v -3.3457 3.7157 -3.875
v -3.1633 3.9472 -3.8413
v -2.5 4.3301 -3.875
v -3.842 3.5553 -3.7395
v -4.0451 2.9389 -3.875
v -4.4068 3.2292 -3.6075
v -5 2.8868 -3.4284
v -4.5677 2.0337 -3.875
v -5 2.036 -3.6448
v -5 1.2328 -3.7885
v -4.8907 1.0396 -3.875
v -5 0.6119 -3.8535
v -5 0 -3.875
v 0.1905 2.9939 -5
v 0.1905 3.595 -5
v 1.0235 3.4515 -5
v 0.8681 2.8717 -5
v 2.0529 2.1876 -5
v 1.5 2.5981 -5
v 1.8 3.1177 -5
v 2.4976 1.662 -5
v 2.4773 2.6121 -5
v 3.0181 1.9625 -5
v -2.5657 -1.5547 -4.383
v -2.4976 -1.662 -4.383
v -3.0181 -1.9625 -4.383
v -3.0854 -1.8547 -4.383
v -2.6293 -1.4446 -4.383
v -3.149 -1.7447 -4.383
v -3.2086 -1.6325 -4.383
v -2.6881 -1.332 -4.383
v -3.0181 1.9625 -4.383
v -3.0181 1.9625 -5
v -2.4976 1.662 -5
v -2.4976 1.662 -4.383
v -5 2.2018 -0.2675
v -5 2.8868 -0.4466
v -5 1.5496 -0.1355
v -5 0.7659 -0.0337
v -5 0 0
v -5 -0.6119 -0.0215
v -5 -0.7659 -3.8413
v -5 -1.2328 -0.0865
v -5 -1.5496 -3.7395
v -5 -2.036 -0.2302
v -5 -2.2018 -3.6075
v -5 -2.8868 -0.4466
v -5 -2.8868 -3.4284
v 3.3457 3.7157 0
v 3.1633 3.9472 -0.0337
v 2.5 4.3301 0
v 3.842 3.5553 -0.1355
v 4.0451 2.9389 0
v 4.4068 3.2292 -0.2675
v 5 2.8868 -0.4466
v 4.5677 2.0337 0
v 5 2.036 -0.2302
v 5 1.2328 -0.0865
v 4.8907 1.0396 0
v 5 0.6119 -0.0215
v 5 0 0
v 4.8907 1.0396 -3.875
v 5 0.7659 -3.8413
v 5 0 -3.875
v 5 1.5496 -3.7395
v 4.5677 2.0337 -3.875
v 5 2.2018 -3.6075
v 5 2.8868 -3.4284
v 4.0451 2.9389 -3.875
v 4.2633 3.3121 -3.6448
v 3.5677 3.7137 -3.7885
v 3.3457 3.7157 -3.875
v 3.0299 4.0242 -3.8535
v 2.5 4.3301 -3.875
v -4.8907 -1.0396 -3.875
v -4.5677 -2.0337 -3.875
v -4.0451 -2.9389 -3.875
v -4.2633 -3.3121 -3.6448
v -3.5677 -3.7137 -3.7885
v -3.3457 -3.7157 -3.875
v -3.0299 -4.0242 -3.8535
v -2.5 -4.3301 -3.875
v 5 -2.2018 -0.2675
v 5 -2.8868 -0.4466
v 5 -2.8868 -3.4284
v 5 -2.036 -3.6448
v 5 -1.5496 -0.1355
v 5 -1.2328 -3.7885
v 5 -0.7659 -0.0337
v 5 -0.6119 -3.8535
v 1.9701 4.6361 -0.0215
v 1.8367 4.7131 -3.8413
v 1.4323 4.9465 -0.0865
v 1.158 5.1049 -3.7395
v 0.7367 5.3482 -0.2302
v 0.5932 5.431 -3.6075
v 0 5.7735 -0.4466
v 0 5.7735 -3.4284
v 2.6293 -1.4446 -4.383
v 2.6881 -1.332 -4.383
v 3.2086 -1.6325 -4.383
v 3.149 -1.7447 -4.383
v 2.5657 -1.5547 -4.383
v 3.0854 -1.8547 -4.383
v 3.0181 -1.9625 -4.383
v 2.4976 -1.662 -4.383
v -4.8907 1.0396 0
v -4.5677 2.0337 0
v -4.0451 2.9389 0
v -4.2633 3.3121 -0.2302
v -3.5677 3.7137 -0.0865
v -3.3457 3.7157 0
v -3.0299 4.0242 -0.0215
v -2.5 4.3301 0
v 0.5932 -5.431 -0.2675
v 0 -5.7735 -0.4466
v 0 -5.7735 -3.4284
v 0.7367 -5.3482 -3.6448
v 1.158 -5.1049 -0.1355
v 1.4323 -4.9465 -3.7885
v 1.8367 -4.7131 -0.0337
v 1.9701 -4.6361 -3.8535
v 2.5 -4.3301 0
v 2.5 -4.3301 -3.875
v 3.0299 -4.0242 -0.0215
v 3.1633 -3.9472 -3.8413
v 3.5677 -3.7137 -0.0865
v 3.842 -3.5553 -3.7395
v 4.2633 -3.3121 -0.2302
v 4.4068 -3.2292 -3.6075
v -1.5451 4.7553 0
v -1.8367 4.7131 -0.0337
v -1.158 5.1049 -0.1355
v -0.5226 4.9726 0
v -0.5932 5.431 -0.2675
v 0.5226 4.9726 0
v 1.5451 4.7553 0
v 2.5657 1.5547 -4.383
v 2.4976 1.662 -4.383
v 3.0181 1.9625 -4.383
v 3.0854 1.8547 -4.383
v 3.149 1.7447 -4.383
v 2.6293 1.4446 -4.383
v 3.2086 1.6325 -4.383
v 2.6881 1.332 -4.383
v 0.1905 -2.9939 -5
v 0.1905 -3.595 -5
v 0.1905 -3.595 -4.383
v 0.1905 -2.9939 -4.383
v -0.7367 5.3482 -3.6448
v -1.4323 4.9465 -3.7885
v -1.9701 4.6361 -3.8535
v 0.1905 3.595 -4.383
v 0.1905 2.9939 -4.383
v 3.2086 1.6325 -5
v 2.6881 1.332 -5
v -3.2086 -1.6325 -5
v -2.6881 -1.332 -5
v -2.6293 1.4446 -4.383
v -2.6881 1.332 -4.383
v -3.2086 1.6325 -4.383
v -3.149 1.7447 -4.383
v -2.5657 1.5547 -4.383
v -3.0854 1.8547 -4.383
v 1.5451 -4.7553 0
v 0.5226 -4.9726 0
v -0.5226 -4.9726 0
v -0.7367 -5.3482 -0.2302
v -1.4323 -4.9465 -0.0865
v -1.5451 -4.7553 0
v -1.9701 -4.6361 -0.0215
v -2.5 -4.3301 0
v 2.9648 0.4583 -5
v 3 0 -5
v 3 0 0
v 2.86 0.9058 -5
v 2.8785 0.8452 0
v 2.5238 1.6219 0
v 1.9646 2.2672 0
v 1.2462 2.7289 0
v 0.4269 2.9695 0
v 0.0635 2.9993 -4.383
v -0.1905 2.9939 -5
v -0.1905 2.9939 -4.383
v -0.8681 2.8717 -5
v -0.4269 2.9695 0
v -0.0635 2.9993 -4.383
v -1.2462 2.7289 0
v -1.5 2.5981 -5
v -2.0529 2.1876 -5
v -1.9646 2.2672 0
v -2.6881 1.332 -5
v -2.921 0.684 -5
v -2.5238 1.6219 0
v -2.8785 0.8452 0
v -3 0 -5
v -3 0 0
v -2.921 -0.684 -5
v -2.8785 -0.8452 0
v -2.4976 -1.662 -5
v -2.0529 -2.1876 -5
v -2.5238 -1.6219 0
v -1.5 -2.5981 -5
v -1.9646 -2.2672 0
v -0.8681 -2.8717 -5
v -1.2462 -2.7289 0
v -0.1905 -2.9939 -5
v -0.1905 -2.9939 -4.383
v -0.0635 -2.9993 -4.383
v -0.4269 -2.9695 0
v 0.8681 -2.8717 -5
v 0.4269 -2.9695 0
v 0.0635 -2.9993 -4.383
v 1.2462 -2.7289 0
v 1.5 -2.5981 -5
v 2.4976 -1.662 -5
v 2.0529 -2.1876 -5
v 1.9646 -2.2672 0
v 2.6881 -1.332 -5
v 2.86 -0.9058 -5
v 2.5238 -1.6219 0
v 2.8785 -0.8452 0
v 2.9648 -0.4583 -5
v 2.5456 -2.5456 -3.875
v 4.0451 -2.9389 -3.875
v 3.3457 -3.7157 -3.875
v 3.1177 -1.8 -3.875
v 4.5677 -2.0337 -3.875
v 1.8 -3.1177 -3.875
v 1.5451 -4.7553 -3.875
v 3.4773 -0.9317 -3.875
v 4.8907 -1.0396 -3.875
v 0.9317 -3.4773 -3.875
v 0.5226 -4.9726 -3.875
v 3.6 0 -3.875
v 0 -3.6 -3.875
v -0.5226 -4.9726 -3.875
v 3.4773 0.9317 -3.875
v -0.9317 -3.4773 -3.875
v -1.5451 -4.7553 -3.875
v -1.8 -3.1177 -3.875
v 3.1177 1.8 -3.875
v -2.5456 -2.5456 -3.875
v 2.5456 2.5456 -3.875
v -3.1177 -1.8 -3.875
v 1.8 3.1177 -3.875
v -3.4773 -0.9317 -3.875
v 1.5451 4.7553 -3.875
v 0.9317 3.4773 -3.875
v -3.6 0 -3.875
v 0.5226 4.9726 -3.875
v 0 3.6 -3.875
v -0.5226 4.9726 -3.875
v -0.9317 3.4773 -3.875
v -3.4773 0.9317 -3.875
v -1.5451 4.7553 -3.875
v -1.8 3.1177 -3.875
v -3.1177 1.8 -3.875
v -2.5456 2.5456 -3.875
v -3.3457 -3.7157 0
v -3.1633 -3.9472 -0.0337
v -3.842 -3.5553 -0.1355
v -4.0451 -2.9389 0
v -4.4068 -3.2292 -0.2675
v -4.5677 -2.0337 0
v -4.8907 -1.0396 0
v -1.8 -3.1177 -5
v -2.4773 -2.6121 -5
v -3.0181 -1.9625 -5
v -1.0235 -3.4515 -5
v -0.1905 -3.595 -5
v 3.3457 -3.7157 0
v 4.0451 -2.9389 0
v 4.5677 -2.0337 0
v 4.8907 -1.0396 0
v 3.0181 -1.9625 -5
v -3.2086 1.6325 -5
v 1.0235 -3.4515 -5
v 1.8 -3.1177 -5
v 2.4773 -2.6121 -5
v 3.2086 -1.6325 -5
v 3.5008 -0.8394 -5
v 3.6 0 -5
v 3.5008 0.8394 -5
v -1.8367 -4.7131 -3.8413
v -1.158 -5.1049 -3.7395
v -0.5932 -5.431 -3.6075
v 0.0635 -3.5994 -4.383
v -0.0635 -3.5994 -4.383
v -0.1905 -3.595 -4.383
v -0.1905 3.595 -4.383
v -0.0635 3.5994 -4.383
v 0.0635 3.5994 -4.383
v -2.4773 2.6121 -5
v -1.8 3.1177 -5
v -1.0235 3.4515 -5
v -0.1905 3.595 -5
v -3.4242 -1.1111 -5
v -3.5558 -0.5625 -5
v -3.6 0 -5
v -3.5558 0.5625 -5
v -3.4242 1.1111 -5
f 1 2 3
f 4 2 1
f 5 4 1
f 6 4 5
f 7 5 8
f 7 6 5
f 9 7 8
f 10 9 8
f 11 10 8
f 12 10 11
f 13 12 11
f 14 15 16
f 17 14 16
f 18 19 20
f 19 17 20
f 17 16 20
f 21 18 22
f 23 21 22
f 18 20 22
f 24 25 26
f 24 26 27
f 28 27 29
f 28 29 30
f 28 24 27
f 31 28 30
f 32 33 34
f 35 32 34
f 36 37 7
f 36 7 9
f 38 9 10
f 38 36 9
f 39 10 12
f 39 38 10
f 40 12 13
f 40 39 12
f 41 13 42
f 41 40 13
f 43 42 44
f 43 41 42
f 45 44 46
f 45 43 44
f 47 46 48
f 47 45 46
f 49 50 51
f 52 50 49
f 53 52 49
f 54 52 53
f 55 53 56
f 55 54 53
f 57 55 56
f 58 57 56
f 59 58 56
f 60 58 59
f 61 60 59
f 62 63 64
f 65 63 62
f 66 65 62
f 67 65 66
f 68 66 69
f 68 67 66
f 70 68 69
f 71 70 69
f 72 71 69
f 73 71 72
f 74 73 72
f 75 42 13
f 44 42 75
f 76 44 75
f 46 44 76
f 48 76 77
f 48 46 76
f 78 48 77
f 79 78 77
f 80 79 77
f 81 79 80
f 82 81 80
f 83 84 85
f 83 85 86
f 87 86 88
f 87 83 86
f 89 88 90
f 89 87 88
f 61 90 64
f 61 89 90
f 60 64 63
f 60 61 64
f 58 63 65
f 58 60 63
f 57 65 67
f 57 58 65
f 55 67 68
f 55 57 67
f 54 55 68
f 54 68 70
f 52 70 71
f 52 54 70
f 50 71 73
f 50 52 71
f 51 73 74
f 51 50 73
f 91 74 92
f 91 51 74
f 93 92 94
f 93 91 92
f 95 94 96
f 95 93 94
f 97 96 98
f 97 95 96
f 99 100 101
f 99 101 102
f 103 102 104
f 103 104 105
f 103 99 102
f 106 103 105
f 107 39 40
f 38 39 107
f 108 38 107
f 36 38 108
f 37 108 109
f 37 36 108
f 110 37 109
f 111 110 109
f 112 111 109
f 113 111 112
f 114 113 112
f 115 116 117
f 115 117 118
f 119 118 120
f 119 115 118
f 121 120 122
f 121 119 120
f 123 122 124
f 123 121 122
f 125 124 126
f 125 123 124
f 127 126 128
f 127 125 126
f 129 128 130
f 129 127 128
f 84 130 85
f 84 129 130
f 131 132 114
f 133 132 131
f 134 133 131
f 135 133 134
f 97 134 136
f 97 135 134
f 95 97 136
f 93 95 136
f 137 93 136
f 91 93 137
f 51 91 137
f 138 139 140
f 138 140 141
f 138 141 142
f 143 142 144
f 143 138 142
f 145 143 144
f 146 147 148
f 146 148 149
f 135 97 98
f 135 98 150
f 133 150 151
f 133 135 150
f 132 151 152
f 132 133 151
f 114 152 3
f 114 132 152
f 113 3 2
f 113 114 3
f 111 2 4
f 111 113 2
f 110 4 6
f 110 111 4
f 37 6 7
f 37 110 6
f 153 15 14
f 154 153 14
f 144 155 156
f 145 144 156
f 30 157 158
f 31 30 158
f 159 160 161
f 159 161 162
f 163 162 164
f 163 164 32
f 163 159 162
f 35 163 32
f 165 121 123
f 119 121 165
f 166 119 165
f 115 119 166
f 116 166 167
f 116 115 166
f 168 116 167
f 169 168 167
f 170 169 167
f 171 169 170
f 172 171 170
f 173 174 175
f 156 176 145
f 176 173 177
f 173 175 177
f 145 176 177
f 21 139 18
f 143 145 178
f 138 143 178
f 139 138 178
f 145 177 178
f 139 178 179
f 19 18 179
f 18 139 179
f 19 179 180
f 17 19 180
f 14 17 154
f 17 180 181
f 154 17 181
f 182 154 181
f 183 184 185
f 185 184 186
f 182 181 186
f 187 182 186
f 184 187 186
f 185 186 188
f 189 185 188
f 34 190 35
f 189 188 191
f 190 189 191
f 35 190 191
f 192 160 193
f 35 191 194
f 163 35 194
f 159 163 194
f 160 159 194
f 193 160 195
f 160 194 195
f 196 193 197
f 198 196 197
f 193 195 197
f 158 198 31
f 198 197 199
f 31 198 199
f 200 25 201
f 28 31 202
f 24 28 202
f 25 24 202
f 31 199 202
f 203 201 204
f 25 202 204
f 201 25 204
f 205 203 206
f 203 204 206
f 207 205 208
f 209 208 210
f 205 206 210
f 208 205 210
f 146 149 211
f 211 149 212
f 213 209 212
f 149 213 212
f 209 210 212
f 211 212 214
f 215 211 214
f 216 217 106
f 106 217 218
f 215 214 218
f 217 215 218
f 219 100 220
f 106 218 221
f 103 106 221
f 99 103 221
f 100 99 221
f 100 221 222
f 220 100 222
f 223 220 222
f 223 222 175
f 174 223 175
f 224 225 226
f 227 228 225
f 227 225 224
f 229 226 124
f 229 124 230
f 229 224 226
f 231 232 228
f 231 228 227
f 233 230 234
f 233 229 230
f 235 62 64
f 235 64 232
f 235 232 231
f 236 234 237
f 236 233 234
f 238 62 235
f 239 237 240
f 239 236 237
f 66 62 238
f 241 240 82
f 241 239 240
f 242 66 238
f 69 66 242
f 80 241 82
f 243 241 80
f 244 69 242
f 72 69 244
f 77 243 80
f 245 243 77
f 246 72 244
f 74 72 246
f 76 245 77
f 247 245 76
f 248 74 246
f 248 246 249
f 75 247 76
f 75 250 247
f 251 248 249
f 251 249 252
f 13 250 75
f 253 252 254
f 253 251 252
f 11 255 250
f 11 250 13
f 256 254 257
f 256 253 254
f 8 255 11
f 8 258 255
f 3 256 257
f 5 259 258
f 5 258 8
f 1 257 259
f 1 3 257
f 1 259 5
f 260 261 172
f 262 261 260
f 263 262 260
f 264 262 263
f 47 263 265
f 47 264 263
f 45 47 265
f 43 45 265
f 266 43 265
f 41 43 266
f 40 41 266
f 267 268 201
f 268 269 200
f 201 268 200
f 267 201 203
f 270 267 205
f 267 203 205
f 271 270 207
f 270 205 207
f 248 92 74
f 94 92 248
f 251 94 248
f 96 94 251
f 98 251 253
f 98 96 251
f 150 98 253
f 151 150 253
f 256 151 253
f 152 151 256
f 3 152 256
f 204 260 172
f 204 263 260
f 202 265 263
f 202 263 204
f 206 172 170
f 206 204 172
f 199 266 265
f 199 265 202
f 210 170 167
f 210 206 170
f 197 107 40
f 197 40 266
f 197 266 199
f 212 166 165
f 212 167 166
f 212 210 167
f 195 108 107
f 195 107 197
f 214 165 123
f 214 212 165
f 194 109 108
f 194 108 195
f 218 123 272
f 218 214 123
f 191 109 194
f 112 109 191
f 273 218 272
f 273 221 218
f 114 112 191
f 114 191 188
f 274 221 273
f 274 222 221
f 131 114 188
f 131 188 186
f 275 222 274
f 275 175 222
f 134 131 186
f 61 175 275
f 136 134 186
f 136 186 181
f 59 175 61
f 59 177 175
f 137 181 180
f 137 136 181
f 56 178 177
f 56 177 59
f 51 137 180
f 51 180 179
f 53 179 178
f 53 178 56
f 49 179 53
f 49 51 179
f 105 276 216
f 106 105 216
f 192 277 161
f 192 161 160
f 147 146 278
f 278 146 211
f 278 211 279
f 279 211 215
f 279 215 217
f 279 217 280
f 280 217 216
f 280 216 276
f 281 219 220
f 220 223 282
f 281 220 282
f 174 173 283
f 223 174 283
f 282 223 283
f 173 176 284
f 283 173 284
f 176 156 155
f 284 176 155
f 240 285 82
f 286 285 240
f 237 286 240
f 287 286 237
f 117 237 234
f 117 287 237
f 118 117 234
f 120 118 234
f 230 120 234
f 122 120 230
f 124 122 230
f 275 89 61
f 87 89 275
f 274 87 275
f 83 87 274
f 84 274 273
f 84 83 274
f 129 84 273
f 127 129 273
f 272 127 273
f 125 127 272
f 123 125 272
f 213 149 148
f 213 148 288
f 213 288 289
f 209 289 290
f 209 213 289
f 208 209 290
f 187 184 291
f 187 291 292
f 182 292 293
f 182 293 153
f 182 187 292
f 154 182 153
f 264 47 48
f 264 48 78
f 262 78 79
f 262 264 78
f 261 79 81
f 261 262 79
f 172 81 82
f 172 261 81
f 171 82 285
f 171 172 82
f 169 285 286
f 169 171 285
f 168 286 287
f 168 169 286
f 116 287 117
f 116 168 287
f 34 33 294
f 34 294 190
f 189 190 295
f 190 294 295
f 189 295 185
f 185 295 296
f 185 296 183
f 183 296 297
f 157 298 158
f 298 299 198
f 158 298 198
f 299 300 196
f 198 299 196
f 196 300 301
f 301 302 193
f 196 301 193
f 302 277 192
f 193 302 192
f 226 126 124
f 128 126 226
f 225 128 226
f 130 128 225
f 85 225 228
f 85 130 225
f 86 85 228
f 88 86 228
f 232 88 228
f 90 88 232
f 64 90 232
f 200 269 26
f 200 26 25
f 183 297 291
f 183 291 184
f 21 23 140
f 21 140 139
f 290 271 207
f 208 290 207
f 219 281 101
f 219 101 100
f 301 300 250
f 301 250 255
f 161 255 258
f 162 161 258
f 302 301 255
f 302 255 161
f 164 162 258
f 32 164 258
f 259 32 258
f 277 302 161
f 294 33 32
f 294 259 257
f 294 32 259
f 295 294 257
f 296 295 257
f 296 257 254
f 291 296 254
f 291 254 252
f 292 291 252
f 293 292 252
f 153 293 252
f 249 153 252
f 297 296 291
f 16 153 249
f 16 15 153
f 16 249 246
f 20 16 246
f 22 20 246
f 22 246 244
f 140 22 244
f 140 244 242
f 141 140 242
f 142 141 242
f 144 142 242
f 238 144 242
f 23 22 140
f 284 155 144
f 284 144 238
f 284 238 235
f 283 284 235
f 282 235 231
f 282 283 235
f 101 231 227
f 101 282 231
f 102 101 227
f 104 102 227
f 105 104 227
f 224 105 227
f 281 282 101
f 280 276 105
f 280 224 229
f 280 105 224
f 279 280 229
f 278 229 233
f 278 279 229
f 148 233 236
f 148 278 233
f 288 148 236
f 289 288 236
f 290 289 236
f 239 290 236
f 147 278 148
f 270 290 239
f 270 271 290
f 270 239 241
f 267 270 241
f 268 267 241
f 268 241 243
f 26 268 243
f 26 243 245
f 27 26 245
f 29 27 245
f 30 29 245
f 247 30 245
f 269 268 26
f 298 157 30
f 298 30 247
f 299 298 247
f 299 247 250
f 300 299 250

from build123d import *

# Parameters (mm, degrees)
EXTRUDE1_DEPTH          = 5
SKETCH2_OUTSIDE_W       = 36
SKETCH2_OUTSIDE_H       = 37.548
SKETCH2_OUTSIDE_R       = 5
CUT_EXTRUDE1_DEPTH      = 6
CUT_EXTRUDE1_TAPER      = 60
SKETCH4_R               = 3
CUT_EXTRUDE3_DEPTH      = 6
SKETCH12_OUTSIDE_W      = 15.214
SKETCH12_OUTSIDE_H      = 16.762
SKETCH12_OUTSIDE_R      = 3.6
CUT_EXTRUDE10_DEPTH     = 1.125
SKETCH15_W              = 0.381
SKETCH15_H              = 5.773502692
CUT_EXTRUDE_THIN2_DEPTH = 0.617
CIRPATTERN1_COUNT       = 6
SKETCH3_OUTSIDE_W       = 32.102
SKETCH3_OUTSIDE_H       = 33.65
SKETCH3_OUTSIDE_R       = 5
CUT_EXTRUDE2_DEPTH      = 4.875
CUT_EXTRUDE2_TAPER      = 60


with BuildPart() as part:
    # Sketch1 → Extrude1 (new body)
    with BuildSketch(Plane.XY):
        Polygon((0, 5.773502692), (-5, 2.886751346), (-5, -2.886751346), (0, -5.773502692), (5, -2.886751346), (5, 2.886751346), align=None)
    extrude(amount=-EXTRUDE1_DEPTH)

    # Sketch2 outside → Cut-Extrude1 (cut, through all)
    with BuildSketch(Plane.XY):
        Rectangle(SKETCH2_OUTSIDE_W, SKETCH2_OUTSIDE_H)
        Circle(SKETCH2_OUTSIDE_R, mode=Mode.SUBTRACT)
    extrude(amount=-CUT_EXTRUDE1_DEPTH, taper=CUT_EXTRUDE1_TAPER, mode=Mode.SUBTRACT)

    # Sketch4 → Cut-Extrude3 (cut, through all)
    with BuildSketch(Plane.XY):
        Circle(SKETCH4_R)
    extrude(amount=-CUT_EXTRUDE3_DEPTH, mode=Mode.SUBTRACT)

    # Sketch12 outside → Cut-Extrude10 (cut)
    with BuildSketch(Plane(origin=(0, 0, -5), x_dir=(-1, 0, 0), z_dir=(0, 0, -1))):
        Rectangle(SKETCH12_OUTSIDE_W, SKETCH12_OUTSIDE_H)
        Circle(SKETCH12_OUTSIDE_R, mode=Mode.SUBTRACT)
    extrude(amount=-CUT_EXTRUDE10_DEPTH, mode=Mode.SUBTRACT)

    # Sketch15 → Cut-Extrude-Thin2 (cut)
    with BuildSketch(Plane(origin=(0, 0, -5), x_dir=(-1, 0, 0), z_dir=(0, 0, -1))):
        with Locations((0, -2.886751346)):
            Rectangle(SKETCH15_W, SKETCH15_H)
    cut_extrude_thin2 = extrude(amount=-CUT_EXTRUDE_THIN2_DEPTH, mode=Mode.SUBTRACT)

    # CirPattern1: Cut-Extrude-Thin2 ×6 about axis
    cirpattern1_axis = Axis((0, 0, 0), (0, 0, 1))
    for i in range(1, CIRPATTERN1_COUNT):
        add(cut_extrude_thin2.rotate(cirpattern1_axis, i * 360 / CIRPATTERN1_COUNT), mode=Mode.SUBTRACT)

    # Sketch3 outside → Cut-Extrude2 (cut, through all)
    with BuildSketch(Plane(origin=(0, 0, -3.875), x_dir=(-1, 0, 0), z_dir=(0, 0, -1))):
        Rectangle(SKETCH3_OUTSIDE_W, SKETCH3_OUTSIDE_H)
        Circle(SKETCH3_OUTSIDE_R, mode=Mode.SUBTRACT)
    extrude(amount=-CUT_EXTRUDE2_DEPTH, taper=CUT_EXTRUDE2_TAPER, mode=Mode.SUBTRACT)


solid = part.part
